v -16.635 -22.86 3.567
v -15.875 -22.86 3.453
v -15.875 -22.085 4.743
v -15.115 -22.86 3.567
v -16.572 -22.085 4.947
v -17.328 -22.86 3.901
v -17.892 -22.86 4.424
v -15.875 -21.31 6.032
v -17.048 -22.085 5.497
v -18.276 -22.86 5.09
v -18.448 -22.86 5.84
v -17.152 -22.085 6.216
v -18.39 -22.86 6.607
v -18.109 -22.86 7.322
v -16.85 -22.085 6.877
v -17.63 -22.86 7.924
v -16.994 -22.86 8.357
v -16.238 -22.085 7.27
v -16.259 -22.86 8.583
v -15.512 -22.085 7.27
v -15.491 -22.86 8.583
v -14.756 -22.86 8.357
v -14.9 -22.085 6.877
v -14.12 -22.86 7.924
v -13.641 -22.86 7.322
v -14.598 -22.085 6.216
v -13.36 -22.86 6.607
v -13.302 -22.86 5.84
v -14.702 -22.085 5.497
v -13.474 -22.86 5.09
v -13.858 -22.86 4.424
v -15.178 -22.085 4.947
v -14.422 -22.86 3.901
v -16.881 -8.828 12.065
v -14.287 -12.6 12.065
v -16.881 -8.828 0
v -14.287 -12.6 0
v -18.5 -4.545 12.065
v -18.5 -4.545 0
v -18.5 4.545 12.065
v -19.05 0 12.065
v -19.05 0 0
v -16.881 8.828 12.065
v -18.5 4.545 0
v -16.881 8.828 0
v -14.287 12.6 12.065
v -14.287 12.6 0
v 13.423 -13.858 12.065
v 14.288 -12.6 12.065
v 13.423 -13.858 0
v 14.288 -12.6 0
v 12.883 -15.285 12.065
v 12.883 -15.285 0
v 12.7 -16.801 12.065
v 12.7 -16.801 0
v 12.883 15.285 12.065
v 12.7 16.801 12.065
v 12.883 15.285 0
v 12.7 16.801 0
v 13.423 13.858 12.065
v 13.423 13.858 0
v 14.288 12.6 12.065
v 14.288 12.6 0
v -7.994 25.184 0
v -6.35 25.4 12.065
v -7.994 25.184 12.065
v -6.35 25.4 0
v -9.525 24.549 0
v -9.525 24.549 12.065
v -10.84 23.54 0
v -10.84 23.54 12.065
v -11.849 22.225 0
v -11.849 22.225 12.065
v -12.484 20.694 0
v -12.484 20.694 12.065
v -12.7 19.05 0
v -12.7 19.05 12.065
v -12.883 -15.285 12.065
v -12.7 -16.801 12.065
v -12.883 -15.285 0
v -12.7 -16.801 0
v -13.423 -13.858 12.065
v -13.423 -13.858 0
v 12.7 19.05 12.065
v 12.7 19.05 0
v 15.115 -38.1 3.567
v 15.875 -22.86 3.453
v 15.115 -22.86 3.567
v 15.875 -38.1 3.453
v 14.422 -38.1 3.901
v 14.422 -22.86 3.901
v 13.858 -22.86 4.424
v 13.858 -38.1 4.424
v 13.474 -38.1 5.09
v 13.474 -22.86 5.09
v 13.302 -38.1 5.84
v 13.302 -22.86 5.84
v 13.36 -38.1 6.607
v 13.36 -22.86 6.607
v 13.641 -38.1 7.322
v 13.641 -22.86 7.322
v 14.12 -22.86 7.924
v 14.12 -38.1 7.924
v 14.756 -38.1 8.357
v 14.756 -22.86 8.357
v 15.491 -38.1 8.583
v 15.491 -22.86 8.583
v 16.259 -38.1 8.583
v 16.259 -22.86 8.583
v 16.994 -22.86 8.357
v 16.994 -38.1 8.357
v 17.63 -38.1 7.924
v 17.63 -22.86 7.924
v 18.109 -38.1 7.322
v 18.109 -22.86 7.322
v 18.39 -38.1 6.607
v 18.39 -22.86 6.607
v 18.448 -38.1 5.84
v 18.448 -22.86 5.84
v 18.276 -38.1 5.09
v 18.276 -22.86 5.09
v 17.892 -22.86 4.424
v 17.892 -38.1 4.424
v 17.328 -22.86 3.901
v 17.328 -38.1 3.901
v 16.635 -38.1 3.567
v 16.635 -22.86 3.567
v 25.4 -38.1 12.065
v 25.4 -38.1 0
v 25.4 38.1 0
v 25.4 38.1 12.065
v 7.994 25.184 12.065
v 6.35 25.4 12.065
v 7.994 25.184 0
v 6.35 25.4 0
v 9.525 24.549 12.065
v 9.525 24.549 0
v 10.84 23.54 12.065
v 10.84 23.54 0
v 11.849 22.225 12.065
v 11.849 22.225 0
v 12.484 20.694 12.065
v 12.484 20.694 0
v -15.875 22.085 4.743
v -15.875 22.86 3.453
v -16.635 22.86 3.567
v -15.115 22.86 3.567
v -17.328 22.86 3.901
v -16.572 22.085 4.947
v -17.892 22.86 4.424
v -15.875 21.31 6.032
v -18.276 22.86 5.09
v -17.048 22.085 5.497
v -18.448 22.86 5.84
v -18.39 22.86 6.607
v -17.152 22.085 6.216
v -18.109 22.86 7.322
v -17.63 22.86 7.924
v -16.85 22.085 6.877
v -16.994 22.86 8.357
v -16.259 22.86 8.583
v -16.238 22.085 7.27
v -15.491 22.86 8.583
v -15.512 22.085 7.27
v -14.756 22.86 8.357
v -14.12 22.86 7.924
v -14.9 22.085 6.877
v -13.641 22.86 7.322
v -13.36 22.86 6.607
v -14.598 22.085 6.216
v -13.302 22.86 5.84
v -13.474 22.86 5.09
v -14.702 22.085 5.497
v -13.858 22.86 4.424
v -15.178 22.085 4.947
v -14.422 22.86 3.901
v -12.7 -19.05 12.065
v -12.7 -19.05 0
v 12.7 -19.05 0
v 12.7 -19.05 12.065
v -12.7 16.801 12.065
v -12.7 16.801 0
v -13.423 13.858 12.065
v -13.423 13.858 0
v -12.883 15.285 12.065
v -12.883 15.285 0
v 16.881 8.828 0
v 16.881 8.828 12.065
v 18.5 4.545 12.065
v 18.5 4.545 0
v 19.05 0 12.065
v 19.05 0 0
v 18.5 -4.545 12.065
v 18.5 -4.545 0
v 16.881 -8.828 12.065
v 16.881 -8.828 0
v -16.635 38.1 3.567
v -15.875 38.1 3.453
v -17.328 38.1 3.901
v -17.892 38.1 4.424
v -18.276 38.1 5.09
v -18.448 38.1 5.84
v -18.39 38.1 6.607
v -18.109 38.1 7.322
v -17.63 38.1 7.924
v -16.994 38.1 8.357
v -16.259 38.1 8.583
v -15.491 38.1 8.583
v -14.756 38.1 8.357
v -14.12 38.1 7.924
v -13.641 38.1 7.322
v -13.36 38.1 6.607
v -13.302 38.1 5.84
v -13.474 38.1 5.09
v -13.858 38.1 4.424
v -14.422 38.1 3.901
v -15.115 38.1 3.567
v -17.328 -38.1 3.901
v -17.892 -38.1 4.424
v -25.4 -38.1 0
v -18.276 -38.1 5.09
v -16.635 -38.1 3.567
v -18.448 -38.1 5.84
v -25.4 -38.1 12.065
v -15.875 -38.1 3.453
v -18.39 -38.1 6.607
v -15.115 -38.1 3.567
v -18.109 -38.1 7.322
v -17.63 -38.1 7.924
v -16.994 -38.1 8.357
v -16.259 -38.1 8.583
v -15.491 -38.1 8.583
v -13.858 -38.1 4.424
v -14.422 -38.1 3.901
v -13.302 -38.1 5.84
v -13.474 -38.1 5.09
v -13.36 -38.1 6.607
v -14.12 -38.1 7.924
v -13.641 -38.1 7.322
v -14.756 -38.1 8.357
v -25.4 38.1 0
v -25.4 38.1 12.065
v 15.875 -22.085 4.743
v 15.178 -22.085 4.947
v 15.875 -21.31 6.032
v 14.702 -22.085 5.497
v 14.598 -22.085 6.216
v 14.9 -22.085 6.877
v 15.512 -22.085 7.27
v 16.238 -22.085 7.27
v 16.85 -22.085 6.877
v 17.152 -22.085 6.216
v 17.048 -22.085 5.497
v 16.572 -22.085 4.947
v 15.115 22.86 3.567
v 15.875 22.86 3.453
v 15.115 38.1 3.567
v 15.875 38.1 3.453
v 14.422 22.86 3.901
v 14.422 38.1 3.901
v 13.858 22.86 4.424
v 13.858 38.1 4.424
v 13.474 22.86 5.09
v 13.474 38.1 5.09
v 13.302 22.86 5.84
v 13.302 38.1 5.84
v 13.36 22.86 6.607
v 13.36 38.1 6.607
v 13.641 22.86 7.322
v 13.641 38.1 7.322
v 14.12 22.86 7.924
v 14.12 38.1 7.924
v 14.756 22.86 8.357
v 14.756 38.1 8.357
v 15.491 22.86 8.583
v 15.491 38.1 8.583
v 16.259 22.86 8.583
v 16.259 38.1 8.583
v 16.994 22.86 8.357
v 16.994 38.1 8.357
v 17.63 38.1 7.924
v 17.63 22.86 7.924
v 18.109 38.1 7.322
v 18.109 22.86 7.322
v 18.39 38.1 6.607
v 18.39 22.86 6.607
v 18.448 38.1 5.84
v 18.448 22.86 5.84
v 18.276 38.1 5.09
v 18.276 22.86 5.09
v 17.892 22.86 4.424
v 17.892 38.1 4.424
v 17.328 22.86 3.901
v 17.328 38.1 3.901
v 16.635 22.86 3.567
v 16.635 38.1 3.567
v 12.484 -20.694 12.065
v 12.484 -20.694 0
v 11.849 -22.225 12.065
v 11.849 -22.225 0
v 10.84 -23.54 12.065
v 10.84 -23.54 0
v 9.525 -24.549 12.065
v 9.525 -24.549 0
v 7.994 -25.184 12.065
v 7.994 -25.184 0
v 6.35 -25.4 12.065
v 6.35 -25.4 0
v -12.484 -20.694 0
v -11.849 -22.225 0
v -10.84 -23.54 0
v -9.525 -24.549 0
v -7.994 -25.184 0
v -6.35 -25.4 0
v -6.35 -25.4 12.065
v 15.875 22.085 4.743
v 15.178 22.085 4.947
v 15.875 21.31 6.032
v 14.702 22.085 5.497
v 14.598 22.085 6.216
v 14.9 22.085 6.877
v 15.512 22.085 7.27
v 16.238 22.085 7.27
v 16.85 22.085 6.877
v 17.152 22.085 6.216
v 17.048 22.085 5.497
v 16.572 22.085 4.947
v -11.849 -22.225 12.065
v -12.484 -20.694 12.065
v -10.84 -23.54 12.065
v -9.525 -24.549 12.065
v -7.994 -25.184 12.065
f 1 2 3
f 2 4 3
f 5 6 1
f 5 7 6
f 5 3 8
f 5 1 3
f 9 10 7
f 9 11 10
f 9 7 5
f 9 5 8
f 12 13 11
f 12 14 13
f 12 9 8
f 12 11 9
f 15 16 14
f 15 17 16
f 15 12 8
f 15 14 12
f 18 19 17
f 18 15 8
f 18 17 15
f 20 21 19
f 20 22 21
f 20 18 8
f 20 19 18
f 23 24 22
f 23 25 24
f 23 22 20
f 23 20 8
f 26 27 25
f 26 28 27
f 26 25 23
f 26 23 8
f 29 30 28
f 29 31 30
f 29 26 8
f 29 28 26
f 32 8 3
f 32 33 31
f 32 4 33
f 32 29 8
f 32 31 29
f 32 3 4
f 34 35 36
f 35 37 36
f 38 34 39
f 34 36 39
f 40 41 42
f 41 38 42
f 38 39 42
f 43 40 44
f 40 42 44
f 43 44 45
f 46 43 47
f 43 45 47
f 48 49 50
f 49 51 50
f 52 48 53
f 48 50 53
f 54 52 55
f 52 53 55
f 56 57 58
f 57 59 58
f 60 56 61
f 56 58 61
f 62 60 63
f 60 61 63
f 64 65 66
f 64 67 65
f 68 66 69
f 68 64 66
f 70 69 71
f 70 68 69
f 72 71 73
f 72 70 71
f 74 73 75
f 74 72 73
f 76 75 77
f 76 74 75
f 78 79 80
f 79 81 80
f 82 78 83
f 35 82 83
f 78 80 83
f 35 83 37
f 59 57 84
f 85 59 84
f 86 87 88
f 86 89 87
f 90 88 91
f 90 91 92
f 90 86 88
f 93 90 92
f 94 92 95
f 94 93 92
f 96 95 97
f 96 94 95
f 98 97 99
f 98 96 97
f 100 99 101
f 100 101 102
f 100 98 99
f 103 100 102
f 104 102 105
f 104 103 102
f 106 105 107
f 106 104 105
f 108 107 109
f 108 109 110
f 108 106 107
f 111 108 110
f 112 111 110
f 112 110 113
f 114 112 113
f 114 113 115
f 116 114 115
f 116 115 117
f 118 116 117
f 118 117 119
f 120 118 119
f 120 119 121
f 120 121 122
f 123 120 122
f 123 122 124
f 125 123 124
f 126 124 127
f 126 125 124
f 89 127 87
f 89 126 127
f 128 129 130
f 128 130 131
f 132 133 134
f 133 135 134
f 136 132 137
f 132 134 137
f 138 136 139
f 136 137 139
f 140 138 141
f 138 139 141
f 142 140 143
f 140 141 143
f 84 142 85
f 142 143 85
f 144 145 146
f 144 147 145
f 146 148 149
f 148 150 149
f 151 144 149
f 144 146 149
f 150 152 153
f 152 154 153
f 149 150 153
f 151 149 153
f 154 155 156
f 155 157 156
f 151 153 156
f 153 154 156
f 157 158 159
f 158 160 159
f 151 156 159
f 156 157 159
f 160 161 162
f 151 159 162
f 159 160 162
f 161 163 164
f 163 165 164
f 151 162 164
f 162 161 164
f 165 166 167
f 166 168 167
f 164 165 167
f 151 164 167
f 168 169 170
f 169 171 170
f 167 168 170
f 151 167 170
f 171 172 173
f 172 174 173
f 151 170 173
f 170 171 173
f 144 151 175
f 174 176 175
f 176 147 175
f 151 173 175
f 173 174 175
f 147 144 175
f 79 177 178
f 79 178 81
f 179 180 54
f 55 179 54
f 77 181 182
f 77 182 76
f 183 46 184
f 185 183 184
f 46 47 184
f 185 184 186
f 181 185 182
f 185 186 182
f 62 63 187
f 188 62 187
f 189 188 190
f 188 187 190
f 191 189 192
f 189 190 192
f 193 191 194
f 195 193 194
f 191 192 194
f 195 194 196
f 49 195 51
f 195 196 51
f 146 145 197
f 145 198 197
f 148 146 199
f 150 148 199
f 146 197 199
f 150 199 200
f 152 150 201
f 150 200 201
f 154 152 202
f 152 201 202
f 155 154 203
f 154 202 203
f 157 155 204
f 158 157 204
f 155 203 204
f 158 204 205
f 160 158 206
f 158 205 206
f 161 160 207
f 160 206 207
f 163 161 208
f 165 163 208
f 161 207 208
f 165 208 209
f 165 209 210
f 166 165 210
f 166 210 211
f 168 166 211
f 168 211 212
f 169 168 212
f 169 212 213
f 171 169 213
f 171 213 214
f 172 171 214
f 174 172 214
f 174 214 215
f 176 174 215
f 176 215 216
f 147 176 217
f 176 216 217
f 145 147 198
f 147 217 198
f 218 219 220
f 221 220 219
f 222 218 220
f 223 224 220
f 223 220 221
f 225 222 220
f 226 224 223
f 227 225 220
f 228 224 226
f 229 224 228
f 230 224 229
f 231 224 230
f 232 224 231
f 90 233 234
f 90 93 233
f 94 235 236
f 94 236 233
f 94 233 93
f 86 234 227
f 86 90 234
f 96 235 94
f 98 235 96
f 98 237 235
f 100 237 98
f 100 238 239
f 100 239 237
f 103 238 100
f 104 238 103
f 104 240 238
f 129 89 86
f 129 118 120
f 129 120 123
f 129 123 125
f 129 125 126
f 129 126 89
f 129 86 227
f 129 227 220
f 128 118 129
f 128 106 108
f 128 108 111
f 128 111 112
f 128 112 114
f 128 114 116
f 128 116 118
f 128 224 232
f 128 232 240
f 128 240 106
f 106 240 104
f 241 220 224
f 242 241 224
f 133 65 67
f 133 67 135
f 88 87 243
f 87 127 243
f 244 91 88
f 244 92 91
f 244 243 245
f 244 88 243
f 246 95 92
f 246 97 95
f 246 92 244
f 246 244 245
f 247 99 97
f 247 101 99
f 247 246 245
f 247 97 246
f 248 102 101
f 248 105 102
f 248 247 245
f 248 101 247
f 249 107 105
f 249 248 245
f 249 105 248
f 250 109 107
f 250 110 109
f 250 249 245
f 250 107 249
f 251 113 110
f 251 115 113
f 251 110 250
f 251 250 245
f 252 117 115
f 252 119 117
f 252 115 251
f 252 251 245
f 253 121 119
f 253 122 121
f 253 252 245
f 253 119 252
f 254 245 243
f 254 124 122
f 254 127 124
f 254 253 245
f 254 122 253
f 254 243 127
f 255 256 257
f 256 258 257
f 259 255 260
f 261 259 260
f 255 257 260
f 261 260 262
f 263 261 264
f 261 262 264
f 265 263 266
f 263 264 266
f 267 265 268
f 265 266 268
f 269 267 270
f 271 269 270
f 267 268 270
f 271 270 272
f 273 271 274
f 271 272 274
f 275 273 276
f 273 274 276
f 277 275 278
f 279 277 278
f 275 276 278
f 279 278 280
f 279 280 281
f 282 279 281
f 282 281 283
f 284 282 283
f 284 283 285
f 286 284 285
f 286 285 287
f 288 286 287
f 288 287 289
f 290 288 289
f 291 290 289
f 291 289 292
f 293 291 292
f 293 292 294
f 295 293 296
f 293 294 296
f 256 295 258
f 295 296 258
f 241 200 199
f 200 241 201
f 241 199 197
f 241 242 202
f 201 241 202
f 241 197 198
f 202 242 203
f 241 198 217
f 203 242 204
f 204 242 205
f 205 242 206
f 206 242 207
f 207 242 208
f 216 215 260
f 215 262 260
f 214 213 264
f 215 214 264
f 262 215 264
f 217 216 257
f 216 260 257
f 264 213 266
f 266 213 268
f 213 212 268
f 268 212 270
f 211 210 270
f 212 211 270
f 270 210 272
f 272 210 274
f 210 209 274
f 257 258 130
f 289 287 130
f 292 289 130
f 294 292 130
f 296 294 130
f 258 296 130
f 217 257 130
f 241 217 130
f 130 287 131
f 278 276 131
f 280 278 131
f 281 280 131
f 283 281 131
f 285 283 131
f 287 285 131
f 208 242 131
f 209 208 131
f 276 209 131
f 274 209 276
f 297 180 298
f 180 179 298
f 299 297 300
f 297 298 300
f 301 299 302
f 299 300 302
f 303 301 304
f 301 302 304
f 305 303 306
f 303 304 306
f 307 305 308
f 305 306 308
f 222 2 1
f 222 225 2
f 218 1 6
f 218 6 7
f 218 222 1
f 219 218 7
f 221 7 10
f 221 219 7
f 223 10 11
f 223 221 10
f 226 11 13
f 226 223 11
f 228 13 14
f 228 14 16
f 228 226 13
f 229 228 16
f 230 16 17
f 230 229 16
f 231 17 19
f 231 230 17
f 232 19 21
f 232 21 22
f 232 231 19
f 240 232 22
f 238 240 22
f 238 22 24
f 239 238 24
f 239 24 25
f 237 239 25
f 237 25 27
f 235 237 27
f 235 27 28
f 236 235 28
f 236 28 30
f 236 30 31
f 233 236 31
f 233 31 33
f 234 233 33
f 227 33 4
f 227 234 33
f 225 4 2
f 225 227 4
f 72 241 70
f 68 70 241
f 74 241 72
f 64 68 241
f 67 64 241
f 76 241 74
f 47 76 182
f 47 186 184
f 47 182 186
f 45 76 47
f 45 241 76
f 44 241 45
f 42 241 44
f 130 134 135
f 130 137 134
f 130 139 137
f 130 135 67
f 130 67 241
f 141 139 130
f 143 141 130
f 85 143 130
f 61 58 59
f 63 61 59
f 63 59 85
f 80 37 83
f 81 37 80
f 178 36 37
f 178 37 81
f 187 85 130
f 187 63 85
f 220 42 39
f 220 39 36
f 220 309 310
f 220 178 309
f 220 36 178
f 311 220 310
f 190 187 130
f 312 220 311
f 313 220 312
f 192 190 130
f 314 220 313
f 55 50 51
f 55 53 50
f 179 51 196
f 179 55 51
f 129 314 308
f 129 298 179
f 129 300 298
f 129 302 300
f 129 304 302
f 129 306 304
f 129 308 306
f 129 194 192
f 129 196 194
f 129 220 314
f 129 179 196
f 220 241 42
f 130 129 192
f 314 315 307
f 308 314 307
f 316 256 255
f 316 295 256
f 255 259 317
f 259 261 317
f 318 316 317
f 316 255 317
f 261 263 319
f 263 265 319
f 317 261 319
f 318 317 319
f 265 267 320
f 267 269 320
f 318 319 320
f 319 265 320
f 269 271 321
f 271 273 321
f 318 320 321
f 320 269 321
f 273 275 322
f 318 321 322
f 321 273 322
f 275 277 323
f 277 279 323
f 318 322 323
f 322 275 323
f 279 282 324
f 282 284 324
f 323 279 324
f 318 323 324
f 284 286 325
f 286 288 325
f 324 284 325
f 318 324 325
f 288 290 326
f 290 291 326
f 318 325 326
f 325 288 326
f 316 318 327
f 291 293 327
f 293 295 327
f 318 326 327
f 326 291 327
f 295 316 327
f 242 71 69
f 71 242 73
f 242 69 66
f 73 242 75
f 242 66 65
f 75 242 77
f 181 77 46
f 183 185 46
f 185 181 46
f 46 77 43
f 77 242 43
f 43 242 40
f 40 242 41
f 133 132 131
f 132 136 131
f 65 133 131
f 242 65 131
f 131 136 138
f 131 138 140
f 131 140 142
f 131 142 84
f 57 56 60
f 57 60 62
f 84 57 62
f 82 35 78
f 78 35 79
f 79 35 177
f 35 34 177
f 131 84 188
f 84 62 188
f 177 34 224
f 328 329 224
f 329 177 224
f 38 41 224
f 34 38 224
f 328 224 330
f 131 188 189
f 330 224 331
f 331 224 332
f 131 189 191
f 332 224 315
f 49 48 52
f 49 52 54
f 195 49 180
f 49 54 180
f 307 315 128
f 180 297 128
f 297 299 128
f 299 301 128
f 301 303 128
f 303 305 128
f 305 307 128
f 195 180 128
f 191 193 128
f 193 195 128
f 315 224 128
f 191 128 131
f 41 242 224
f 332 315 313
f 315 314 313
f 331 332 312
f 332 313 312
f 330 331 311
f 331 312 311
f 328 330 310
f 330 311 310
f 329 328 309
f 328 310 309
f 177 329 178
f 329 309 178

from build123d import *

# Parameters (mm, degrees)
SKETCH1_W                                 = 50.8
SKETCH1_H                                 = 63.5
BOSS_EXTRUDE1_DEPTH                       = 12.065
SKETCH6_W                                 = 50.8
SKETCH6_H                                 = 12.065
BOSS_EXTRUDE2_DEPTH                       = 6.35
F_13_64_0_20313_DIAMETER_HOLE1_AT_2_COUNT = 2
F_13_64_0_20313_DIAMETER_HOLE1_AT_2_PITCH = 31.75
SKETCH12_W                                = 25.4
SKETCH12_H                                = 50.8
CUT_EXTRUDE7_DEPTH                        = 48.353291596
FILLET1_R                                 = 6.35
SKETCH13_R                                = 19.05
CUT_EXTRUDE8_DEPTH                        = 48.353291596
FILLET2_R                                 = 6.35


with BuildPart() as part:
    # Sketch1 → Boss-Extrude1 (new body)
    with BuildSketch(Plane.XY):
        Rectangle(SKETCH1_W, SKETCH1_H)
    extrude(amount=BOSS_EXTRUDE1_DEPTH)

    # Sketch6 → Boss-Extrude2 (add)
    with BuildSketch(Plane.XZ.offset(31.75)):
        with Locations((0, 6.0325)):
            Rectangle(SKETCH6_W, SKETCH6_H)
    boss_extrude2 = extrude(amount=BOSS_EXTRUDE2_DEPTH)

    # Sketch8 → 13_64 _0.20313_ Diameter Hole1 (revolve, cut)
    with BuildSketch(Plane(origin=(-15.875, -38.1, 6.0325), x_dir=(0, 0, -1), z_dir=(1, 0, 0))):
        Polygon((0, 0), (0, 16.790070783), (2.579751, 15.24), (2.579751, 0), align=None)
    f_13_64_0_20313_diameter_hole1 = revolve(axis=Axis((-15.875, -44.45, 6.0325), (0, 1, 0)), mode=Mode.SUBTRACT)

    # 13_64 _0.20313_ Diameter Hole1 at 2: 13_64 _0.20313_ Diameter Hole1 ×2
    with Locations(*[(i * F_13_64_0_20313_DIAMETER_HOLE1_AT_2_PITCH, 0, 0) for i in range(1, F_13_64_0_20313_DIAMETER_HOLE1_AT_2_COUNT)]):
        add(f_13_64_0_20313_diameter_hole1, mode=Mode.SUBTRACT)

    # Mirror2: Boss-Extrude2, 13_64 _0.20313_ Diameter Hole1 across plane
    add(boss_extrude2.mirror(Plane.ZX))
    add(f_13_64_0_20313_diameter_hole1.mirror(Plane.ZX), mode=Mode.SUBTRACT)

    # Mirror2 copy 1 sketch → Mirror2 copy 1 (revolve, cut)
    with BuildSketch(Plane(origin=(15.875, 38.1, 6.0325), x_dir=(0, 0, -1), z_dir=(1, 0, 0))):
        Polygon((0, 0), (0, -16.790070783), (2.579751, -15.24), (2.579751, 0), align=None)
    revolve(axis=Axis((15.875, 44.45, 6.0325), (0, 1, 0)), mode=Mode.SUBTRACT)

    # Sketch12 → Cut-Extrude7 (cut, through all)
    with BuildSketch(Plane.XY.offset(12.065)):
        Rectangle(SKETCH12_W, SKETCH12_H)
    extrude(amount=-CUT_EXTRUDE7_DEPTH, mode=Mode.SUBTRACT)

    # Fillet1
    fillet1_edges = [part.edges().sort_by_distance(p)[0] for p in [
        (-12.7, -25.4, 6.0325),
        (-12.7, 25.4, 6.0325),
        (12.7, 25.4, 6.0325),
        (12.7, -25.4, 6.0325),
    ]]
    fillet(fillet1_edges, radius=FILLET1_R)

    # Sketch13 → Cut-Extrude8 (cut, through all)
    with BuildSketch(Plane(origin=(0, 0, 0), x_dir=(-1, 0, 0), z_dir=(0, 0, -1))):
        Circle(SKETCH13_R)
    extrude(amount=-CUT_EXTRUDE8_DEPTH, mode=Mode.SUBTRACT)

    # Fillet2
    fillet2_edges = [part.edges().sort_by_distance(p)[0] for p in [
        (12.7, 14.199031657, 6.0325),
        (12.7, -14.199031657, 6.0325),
        (-12.7, 14.199031657, 6.0325),
        (-12.7, -14.199031657, 6.0325),
    ]]
    fillet(fillet2_edges, radius=FILLET2_R)


solid = part.part
